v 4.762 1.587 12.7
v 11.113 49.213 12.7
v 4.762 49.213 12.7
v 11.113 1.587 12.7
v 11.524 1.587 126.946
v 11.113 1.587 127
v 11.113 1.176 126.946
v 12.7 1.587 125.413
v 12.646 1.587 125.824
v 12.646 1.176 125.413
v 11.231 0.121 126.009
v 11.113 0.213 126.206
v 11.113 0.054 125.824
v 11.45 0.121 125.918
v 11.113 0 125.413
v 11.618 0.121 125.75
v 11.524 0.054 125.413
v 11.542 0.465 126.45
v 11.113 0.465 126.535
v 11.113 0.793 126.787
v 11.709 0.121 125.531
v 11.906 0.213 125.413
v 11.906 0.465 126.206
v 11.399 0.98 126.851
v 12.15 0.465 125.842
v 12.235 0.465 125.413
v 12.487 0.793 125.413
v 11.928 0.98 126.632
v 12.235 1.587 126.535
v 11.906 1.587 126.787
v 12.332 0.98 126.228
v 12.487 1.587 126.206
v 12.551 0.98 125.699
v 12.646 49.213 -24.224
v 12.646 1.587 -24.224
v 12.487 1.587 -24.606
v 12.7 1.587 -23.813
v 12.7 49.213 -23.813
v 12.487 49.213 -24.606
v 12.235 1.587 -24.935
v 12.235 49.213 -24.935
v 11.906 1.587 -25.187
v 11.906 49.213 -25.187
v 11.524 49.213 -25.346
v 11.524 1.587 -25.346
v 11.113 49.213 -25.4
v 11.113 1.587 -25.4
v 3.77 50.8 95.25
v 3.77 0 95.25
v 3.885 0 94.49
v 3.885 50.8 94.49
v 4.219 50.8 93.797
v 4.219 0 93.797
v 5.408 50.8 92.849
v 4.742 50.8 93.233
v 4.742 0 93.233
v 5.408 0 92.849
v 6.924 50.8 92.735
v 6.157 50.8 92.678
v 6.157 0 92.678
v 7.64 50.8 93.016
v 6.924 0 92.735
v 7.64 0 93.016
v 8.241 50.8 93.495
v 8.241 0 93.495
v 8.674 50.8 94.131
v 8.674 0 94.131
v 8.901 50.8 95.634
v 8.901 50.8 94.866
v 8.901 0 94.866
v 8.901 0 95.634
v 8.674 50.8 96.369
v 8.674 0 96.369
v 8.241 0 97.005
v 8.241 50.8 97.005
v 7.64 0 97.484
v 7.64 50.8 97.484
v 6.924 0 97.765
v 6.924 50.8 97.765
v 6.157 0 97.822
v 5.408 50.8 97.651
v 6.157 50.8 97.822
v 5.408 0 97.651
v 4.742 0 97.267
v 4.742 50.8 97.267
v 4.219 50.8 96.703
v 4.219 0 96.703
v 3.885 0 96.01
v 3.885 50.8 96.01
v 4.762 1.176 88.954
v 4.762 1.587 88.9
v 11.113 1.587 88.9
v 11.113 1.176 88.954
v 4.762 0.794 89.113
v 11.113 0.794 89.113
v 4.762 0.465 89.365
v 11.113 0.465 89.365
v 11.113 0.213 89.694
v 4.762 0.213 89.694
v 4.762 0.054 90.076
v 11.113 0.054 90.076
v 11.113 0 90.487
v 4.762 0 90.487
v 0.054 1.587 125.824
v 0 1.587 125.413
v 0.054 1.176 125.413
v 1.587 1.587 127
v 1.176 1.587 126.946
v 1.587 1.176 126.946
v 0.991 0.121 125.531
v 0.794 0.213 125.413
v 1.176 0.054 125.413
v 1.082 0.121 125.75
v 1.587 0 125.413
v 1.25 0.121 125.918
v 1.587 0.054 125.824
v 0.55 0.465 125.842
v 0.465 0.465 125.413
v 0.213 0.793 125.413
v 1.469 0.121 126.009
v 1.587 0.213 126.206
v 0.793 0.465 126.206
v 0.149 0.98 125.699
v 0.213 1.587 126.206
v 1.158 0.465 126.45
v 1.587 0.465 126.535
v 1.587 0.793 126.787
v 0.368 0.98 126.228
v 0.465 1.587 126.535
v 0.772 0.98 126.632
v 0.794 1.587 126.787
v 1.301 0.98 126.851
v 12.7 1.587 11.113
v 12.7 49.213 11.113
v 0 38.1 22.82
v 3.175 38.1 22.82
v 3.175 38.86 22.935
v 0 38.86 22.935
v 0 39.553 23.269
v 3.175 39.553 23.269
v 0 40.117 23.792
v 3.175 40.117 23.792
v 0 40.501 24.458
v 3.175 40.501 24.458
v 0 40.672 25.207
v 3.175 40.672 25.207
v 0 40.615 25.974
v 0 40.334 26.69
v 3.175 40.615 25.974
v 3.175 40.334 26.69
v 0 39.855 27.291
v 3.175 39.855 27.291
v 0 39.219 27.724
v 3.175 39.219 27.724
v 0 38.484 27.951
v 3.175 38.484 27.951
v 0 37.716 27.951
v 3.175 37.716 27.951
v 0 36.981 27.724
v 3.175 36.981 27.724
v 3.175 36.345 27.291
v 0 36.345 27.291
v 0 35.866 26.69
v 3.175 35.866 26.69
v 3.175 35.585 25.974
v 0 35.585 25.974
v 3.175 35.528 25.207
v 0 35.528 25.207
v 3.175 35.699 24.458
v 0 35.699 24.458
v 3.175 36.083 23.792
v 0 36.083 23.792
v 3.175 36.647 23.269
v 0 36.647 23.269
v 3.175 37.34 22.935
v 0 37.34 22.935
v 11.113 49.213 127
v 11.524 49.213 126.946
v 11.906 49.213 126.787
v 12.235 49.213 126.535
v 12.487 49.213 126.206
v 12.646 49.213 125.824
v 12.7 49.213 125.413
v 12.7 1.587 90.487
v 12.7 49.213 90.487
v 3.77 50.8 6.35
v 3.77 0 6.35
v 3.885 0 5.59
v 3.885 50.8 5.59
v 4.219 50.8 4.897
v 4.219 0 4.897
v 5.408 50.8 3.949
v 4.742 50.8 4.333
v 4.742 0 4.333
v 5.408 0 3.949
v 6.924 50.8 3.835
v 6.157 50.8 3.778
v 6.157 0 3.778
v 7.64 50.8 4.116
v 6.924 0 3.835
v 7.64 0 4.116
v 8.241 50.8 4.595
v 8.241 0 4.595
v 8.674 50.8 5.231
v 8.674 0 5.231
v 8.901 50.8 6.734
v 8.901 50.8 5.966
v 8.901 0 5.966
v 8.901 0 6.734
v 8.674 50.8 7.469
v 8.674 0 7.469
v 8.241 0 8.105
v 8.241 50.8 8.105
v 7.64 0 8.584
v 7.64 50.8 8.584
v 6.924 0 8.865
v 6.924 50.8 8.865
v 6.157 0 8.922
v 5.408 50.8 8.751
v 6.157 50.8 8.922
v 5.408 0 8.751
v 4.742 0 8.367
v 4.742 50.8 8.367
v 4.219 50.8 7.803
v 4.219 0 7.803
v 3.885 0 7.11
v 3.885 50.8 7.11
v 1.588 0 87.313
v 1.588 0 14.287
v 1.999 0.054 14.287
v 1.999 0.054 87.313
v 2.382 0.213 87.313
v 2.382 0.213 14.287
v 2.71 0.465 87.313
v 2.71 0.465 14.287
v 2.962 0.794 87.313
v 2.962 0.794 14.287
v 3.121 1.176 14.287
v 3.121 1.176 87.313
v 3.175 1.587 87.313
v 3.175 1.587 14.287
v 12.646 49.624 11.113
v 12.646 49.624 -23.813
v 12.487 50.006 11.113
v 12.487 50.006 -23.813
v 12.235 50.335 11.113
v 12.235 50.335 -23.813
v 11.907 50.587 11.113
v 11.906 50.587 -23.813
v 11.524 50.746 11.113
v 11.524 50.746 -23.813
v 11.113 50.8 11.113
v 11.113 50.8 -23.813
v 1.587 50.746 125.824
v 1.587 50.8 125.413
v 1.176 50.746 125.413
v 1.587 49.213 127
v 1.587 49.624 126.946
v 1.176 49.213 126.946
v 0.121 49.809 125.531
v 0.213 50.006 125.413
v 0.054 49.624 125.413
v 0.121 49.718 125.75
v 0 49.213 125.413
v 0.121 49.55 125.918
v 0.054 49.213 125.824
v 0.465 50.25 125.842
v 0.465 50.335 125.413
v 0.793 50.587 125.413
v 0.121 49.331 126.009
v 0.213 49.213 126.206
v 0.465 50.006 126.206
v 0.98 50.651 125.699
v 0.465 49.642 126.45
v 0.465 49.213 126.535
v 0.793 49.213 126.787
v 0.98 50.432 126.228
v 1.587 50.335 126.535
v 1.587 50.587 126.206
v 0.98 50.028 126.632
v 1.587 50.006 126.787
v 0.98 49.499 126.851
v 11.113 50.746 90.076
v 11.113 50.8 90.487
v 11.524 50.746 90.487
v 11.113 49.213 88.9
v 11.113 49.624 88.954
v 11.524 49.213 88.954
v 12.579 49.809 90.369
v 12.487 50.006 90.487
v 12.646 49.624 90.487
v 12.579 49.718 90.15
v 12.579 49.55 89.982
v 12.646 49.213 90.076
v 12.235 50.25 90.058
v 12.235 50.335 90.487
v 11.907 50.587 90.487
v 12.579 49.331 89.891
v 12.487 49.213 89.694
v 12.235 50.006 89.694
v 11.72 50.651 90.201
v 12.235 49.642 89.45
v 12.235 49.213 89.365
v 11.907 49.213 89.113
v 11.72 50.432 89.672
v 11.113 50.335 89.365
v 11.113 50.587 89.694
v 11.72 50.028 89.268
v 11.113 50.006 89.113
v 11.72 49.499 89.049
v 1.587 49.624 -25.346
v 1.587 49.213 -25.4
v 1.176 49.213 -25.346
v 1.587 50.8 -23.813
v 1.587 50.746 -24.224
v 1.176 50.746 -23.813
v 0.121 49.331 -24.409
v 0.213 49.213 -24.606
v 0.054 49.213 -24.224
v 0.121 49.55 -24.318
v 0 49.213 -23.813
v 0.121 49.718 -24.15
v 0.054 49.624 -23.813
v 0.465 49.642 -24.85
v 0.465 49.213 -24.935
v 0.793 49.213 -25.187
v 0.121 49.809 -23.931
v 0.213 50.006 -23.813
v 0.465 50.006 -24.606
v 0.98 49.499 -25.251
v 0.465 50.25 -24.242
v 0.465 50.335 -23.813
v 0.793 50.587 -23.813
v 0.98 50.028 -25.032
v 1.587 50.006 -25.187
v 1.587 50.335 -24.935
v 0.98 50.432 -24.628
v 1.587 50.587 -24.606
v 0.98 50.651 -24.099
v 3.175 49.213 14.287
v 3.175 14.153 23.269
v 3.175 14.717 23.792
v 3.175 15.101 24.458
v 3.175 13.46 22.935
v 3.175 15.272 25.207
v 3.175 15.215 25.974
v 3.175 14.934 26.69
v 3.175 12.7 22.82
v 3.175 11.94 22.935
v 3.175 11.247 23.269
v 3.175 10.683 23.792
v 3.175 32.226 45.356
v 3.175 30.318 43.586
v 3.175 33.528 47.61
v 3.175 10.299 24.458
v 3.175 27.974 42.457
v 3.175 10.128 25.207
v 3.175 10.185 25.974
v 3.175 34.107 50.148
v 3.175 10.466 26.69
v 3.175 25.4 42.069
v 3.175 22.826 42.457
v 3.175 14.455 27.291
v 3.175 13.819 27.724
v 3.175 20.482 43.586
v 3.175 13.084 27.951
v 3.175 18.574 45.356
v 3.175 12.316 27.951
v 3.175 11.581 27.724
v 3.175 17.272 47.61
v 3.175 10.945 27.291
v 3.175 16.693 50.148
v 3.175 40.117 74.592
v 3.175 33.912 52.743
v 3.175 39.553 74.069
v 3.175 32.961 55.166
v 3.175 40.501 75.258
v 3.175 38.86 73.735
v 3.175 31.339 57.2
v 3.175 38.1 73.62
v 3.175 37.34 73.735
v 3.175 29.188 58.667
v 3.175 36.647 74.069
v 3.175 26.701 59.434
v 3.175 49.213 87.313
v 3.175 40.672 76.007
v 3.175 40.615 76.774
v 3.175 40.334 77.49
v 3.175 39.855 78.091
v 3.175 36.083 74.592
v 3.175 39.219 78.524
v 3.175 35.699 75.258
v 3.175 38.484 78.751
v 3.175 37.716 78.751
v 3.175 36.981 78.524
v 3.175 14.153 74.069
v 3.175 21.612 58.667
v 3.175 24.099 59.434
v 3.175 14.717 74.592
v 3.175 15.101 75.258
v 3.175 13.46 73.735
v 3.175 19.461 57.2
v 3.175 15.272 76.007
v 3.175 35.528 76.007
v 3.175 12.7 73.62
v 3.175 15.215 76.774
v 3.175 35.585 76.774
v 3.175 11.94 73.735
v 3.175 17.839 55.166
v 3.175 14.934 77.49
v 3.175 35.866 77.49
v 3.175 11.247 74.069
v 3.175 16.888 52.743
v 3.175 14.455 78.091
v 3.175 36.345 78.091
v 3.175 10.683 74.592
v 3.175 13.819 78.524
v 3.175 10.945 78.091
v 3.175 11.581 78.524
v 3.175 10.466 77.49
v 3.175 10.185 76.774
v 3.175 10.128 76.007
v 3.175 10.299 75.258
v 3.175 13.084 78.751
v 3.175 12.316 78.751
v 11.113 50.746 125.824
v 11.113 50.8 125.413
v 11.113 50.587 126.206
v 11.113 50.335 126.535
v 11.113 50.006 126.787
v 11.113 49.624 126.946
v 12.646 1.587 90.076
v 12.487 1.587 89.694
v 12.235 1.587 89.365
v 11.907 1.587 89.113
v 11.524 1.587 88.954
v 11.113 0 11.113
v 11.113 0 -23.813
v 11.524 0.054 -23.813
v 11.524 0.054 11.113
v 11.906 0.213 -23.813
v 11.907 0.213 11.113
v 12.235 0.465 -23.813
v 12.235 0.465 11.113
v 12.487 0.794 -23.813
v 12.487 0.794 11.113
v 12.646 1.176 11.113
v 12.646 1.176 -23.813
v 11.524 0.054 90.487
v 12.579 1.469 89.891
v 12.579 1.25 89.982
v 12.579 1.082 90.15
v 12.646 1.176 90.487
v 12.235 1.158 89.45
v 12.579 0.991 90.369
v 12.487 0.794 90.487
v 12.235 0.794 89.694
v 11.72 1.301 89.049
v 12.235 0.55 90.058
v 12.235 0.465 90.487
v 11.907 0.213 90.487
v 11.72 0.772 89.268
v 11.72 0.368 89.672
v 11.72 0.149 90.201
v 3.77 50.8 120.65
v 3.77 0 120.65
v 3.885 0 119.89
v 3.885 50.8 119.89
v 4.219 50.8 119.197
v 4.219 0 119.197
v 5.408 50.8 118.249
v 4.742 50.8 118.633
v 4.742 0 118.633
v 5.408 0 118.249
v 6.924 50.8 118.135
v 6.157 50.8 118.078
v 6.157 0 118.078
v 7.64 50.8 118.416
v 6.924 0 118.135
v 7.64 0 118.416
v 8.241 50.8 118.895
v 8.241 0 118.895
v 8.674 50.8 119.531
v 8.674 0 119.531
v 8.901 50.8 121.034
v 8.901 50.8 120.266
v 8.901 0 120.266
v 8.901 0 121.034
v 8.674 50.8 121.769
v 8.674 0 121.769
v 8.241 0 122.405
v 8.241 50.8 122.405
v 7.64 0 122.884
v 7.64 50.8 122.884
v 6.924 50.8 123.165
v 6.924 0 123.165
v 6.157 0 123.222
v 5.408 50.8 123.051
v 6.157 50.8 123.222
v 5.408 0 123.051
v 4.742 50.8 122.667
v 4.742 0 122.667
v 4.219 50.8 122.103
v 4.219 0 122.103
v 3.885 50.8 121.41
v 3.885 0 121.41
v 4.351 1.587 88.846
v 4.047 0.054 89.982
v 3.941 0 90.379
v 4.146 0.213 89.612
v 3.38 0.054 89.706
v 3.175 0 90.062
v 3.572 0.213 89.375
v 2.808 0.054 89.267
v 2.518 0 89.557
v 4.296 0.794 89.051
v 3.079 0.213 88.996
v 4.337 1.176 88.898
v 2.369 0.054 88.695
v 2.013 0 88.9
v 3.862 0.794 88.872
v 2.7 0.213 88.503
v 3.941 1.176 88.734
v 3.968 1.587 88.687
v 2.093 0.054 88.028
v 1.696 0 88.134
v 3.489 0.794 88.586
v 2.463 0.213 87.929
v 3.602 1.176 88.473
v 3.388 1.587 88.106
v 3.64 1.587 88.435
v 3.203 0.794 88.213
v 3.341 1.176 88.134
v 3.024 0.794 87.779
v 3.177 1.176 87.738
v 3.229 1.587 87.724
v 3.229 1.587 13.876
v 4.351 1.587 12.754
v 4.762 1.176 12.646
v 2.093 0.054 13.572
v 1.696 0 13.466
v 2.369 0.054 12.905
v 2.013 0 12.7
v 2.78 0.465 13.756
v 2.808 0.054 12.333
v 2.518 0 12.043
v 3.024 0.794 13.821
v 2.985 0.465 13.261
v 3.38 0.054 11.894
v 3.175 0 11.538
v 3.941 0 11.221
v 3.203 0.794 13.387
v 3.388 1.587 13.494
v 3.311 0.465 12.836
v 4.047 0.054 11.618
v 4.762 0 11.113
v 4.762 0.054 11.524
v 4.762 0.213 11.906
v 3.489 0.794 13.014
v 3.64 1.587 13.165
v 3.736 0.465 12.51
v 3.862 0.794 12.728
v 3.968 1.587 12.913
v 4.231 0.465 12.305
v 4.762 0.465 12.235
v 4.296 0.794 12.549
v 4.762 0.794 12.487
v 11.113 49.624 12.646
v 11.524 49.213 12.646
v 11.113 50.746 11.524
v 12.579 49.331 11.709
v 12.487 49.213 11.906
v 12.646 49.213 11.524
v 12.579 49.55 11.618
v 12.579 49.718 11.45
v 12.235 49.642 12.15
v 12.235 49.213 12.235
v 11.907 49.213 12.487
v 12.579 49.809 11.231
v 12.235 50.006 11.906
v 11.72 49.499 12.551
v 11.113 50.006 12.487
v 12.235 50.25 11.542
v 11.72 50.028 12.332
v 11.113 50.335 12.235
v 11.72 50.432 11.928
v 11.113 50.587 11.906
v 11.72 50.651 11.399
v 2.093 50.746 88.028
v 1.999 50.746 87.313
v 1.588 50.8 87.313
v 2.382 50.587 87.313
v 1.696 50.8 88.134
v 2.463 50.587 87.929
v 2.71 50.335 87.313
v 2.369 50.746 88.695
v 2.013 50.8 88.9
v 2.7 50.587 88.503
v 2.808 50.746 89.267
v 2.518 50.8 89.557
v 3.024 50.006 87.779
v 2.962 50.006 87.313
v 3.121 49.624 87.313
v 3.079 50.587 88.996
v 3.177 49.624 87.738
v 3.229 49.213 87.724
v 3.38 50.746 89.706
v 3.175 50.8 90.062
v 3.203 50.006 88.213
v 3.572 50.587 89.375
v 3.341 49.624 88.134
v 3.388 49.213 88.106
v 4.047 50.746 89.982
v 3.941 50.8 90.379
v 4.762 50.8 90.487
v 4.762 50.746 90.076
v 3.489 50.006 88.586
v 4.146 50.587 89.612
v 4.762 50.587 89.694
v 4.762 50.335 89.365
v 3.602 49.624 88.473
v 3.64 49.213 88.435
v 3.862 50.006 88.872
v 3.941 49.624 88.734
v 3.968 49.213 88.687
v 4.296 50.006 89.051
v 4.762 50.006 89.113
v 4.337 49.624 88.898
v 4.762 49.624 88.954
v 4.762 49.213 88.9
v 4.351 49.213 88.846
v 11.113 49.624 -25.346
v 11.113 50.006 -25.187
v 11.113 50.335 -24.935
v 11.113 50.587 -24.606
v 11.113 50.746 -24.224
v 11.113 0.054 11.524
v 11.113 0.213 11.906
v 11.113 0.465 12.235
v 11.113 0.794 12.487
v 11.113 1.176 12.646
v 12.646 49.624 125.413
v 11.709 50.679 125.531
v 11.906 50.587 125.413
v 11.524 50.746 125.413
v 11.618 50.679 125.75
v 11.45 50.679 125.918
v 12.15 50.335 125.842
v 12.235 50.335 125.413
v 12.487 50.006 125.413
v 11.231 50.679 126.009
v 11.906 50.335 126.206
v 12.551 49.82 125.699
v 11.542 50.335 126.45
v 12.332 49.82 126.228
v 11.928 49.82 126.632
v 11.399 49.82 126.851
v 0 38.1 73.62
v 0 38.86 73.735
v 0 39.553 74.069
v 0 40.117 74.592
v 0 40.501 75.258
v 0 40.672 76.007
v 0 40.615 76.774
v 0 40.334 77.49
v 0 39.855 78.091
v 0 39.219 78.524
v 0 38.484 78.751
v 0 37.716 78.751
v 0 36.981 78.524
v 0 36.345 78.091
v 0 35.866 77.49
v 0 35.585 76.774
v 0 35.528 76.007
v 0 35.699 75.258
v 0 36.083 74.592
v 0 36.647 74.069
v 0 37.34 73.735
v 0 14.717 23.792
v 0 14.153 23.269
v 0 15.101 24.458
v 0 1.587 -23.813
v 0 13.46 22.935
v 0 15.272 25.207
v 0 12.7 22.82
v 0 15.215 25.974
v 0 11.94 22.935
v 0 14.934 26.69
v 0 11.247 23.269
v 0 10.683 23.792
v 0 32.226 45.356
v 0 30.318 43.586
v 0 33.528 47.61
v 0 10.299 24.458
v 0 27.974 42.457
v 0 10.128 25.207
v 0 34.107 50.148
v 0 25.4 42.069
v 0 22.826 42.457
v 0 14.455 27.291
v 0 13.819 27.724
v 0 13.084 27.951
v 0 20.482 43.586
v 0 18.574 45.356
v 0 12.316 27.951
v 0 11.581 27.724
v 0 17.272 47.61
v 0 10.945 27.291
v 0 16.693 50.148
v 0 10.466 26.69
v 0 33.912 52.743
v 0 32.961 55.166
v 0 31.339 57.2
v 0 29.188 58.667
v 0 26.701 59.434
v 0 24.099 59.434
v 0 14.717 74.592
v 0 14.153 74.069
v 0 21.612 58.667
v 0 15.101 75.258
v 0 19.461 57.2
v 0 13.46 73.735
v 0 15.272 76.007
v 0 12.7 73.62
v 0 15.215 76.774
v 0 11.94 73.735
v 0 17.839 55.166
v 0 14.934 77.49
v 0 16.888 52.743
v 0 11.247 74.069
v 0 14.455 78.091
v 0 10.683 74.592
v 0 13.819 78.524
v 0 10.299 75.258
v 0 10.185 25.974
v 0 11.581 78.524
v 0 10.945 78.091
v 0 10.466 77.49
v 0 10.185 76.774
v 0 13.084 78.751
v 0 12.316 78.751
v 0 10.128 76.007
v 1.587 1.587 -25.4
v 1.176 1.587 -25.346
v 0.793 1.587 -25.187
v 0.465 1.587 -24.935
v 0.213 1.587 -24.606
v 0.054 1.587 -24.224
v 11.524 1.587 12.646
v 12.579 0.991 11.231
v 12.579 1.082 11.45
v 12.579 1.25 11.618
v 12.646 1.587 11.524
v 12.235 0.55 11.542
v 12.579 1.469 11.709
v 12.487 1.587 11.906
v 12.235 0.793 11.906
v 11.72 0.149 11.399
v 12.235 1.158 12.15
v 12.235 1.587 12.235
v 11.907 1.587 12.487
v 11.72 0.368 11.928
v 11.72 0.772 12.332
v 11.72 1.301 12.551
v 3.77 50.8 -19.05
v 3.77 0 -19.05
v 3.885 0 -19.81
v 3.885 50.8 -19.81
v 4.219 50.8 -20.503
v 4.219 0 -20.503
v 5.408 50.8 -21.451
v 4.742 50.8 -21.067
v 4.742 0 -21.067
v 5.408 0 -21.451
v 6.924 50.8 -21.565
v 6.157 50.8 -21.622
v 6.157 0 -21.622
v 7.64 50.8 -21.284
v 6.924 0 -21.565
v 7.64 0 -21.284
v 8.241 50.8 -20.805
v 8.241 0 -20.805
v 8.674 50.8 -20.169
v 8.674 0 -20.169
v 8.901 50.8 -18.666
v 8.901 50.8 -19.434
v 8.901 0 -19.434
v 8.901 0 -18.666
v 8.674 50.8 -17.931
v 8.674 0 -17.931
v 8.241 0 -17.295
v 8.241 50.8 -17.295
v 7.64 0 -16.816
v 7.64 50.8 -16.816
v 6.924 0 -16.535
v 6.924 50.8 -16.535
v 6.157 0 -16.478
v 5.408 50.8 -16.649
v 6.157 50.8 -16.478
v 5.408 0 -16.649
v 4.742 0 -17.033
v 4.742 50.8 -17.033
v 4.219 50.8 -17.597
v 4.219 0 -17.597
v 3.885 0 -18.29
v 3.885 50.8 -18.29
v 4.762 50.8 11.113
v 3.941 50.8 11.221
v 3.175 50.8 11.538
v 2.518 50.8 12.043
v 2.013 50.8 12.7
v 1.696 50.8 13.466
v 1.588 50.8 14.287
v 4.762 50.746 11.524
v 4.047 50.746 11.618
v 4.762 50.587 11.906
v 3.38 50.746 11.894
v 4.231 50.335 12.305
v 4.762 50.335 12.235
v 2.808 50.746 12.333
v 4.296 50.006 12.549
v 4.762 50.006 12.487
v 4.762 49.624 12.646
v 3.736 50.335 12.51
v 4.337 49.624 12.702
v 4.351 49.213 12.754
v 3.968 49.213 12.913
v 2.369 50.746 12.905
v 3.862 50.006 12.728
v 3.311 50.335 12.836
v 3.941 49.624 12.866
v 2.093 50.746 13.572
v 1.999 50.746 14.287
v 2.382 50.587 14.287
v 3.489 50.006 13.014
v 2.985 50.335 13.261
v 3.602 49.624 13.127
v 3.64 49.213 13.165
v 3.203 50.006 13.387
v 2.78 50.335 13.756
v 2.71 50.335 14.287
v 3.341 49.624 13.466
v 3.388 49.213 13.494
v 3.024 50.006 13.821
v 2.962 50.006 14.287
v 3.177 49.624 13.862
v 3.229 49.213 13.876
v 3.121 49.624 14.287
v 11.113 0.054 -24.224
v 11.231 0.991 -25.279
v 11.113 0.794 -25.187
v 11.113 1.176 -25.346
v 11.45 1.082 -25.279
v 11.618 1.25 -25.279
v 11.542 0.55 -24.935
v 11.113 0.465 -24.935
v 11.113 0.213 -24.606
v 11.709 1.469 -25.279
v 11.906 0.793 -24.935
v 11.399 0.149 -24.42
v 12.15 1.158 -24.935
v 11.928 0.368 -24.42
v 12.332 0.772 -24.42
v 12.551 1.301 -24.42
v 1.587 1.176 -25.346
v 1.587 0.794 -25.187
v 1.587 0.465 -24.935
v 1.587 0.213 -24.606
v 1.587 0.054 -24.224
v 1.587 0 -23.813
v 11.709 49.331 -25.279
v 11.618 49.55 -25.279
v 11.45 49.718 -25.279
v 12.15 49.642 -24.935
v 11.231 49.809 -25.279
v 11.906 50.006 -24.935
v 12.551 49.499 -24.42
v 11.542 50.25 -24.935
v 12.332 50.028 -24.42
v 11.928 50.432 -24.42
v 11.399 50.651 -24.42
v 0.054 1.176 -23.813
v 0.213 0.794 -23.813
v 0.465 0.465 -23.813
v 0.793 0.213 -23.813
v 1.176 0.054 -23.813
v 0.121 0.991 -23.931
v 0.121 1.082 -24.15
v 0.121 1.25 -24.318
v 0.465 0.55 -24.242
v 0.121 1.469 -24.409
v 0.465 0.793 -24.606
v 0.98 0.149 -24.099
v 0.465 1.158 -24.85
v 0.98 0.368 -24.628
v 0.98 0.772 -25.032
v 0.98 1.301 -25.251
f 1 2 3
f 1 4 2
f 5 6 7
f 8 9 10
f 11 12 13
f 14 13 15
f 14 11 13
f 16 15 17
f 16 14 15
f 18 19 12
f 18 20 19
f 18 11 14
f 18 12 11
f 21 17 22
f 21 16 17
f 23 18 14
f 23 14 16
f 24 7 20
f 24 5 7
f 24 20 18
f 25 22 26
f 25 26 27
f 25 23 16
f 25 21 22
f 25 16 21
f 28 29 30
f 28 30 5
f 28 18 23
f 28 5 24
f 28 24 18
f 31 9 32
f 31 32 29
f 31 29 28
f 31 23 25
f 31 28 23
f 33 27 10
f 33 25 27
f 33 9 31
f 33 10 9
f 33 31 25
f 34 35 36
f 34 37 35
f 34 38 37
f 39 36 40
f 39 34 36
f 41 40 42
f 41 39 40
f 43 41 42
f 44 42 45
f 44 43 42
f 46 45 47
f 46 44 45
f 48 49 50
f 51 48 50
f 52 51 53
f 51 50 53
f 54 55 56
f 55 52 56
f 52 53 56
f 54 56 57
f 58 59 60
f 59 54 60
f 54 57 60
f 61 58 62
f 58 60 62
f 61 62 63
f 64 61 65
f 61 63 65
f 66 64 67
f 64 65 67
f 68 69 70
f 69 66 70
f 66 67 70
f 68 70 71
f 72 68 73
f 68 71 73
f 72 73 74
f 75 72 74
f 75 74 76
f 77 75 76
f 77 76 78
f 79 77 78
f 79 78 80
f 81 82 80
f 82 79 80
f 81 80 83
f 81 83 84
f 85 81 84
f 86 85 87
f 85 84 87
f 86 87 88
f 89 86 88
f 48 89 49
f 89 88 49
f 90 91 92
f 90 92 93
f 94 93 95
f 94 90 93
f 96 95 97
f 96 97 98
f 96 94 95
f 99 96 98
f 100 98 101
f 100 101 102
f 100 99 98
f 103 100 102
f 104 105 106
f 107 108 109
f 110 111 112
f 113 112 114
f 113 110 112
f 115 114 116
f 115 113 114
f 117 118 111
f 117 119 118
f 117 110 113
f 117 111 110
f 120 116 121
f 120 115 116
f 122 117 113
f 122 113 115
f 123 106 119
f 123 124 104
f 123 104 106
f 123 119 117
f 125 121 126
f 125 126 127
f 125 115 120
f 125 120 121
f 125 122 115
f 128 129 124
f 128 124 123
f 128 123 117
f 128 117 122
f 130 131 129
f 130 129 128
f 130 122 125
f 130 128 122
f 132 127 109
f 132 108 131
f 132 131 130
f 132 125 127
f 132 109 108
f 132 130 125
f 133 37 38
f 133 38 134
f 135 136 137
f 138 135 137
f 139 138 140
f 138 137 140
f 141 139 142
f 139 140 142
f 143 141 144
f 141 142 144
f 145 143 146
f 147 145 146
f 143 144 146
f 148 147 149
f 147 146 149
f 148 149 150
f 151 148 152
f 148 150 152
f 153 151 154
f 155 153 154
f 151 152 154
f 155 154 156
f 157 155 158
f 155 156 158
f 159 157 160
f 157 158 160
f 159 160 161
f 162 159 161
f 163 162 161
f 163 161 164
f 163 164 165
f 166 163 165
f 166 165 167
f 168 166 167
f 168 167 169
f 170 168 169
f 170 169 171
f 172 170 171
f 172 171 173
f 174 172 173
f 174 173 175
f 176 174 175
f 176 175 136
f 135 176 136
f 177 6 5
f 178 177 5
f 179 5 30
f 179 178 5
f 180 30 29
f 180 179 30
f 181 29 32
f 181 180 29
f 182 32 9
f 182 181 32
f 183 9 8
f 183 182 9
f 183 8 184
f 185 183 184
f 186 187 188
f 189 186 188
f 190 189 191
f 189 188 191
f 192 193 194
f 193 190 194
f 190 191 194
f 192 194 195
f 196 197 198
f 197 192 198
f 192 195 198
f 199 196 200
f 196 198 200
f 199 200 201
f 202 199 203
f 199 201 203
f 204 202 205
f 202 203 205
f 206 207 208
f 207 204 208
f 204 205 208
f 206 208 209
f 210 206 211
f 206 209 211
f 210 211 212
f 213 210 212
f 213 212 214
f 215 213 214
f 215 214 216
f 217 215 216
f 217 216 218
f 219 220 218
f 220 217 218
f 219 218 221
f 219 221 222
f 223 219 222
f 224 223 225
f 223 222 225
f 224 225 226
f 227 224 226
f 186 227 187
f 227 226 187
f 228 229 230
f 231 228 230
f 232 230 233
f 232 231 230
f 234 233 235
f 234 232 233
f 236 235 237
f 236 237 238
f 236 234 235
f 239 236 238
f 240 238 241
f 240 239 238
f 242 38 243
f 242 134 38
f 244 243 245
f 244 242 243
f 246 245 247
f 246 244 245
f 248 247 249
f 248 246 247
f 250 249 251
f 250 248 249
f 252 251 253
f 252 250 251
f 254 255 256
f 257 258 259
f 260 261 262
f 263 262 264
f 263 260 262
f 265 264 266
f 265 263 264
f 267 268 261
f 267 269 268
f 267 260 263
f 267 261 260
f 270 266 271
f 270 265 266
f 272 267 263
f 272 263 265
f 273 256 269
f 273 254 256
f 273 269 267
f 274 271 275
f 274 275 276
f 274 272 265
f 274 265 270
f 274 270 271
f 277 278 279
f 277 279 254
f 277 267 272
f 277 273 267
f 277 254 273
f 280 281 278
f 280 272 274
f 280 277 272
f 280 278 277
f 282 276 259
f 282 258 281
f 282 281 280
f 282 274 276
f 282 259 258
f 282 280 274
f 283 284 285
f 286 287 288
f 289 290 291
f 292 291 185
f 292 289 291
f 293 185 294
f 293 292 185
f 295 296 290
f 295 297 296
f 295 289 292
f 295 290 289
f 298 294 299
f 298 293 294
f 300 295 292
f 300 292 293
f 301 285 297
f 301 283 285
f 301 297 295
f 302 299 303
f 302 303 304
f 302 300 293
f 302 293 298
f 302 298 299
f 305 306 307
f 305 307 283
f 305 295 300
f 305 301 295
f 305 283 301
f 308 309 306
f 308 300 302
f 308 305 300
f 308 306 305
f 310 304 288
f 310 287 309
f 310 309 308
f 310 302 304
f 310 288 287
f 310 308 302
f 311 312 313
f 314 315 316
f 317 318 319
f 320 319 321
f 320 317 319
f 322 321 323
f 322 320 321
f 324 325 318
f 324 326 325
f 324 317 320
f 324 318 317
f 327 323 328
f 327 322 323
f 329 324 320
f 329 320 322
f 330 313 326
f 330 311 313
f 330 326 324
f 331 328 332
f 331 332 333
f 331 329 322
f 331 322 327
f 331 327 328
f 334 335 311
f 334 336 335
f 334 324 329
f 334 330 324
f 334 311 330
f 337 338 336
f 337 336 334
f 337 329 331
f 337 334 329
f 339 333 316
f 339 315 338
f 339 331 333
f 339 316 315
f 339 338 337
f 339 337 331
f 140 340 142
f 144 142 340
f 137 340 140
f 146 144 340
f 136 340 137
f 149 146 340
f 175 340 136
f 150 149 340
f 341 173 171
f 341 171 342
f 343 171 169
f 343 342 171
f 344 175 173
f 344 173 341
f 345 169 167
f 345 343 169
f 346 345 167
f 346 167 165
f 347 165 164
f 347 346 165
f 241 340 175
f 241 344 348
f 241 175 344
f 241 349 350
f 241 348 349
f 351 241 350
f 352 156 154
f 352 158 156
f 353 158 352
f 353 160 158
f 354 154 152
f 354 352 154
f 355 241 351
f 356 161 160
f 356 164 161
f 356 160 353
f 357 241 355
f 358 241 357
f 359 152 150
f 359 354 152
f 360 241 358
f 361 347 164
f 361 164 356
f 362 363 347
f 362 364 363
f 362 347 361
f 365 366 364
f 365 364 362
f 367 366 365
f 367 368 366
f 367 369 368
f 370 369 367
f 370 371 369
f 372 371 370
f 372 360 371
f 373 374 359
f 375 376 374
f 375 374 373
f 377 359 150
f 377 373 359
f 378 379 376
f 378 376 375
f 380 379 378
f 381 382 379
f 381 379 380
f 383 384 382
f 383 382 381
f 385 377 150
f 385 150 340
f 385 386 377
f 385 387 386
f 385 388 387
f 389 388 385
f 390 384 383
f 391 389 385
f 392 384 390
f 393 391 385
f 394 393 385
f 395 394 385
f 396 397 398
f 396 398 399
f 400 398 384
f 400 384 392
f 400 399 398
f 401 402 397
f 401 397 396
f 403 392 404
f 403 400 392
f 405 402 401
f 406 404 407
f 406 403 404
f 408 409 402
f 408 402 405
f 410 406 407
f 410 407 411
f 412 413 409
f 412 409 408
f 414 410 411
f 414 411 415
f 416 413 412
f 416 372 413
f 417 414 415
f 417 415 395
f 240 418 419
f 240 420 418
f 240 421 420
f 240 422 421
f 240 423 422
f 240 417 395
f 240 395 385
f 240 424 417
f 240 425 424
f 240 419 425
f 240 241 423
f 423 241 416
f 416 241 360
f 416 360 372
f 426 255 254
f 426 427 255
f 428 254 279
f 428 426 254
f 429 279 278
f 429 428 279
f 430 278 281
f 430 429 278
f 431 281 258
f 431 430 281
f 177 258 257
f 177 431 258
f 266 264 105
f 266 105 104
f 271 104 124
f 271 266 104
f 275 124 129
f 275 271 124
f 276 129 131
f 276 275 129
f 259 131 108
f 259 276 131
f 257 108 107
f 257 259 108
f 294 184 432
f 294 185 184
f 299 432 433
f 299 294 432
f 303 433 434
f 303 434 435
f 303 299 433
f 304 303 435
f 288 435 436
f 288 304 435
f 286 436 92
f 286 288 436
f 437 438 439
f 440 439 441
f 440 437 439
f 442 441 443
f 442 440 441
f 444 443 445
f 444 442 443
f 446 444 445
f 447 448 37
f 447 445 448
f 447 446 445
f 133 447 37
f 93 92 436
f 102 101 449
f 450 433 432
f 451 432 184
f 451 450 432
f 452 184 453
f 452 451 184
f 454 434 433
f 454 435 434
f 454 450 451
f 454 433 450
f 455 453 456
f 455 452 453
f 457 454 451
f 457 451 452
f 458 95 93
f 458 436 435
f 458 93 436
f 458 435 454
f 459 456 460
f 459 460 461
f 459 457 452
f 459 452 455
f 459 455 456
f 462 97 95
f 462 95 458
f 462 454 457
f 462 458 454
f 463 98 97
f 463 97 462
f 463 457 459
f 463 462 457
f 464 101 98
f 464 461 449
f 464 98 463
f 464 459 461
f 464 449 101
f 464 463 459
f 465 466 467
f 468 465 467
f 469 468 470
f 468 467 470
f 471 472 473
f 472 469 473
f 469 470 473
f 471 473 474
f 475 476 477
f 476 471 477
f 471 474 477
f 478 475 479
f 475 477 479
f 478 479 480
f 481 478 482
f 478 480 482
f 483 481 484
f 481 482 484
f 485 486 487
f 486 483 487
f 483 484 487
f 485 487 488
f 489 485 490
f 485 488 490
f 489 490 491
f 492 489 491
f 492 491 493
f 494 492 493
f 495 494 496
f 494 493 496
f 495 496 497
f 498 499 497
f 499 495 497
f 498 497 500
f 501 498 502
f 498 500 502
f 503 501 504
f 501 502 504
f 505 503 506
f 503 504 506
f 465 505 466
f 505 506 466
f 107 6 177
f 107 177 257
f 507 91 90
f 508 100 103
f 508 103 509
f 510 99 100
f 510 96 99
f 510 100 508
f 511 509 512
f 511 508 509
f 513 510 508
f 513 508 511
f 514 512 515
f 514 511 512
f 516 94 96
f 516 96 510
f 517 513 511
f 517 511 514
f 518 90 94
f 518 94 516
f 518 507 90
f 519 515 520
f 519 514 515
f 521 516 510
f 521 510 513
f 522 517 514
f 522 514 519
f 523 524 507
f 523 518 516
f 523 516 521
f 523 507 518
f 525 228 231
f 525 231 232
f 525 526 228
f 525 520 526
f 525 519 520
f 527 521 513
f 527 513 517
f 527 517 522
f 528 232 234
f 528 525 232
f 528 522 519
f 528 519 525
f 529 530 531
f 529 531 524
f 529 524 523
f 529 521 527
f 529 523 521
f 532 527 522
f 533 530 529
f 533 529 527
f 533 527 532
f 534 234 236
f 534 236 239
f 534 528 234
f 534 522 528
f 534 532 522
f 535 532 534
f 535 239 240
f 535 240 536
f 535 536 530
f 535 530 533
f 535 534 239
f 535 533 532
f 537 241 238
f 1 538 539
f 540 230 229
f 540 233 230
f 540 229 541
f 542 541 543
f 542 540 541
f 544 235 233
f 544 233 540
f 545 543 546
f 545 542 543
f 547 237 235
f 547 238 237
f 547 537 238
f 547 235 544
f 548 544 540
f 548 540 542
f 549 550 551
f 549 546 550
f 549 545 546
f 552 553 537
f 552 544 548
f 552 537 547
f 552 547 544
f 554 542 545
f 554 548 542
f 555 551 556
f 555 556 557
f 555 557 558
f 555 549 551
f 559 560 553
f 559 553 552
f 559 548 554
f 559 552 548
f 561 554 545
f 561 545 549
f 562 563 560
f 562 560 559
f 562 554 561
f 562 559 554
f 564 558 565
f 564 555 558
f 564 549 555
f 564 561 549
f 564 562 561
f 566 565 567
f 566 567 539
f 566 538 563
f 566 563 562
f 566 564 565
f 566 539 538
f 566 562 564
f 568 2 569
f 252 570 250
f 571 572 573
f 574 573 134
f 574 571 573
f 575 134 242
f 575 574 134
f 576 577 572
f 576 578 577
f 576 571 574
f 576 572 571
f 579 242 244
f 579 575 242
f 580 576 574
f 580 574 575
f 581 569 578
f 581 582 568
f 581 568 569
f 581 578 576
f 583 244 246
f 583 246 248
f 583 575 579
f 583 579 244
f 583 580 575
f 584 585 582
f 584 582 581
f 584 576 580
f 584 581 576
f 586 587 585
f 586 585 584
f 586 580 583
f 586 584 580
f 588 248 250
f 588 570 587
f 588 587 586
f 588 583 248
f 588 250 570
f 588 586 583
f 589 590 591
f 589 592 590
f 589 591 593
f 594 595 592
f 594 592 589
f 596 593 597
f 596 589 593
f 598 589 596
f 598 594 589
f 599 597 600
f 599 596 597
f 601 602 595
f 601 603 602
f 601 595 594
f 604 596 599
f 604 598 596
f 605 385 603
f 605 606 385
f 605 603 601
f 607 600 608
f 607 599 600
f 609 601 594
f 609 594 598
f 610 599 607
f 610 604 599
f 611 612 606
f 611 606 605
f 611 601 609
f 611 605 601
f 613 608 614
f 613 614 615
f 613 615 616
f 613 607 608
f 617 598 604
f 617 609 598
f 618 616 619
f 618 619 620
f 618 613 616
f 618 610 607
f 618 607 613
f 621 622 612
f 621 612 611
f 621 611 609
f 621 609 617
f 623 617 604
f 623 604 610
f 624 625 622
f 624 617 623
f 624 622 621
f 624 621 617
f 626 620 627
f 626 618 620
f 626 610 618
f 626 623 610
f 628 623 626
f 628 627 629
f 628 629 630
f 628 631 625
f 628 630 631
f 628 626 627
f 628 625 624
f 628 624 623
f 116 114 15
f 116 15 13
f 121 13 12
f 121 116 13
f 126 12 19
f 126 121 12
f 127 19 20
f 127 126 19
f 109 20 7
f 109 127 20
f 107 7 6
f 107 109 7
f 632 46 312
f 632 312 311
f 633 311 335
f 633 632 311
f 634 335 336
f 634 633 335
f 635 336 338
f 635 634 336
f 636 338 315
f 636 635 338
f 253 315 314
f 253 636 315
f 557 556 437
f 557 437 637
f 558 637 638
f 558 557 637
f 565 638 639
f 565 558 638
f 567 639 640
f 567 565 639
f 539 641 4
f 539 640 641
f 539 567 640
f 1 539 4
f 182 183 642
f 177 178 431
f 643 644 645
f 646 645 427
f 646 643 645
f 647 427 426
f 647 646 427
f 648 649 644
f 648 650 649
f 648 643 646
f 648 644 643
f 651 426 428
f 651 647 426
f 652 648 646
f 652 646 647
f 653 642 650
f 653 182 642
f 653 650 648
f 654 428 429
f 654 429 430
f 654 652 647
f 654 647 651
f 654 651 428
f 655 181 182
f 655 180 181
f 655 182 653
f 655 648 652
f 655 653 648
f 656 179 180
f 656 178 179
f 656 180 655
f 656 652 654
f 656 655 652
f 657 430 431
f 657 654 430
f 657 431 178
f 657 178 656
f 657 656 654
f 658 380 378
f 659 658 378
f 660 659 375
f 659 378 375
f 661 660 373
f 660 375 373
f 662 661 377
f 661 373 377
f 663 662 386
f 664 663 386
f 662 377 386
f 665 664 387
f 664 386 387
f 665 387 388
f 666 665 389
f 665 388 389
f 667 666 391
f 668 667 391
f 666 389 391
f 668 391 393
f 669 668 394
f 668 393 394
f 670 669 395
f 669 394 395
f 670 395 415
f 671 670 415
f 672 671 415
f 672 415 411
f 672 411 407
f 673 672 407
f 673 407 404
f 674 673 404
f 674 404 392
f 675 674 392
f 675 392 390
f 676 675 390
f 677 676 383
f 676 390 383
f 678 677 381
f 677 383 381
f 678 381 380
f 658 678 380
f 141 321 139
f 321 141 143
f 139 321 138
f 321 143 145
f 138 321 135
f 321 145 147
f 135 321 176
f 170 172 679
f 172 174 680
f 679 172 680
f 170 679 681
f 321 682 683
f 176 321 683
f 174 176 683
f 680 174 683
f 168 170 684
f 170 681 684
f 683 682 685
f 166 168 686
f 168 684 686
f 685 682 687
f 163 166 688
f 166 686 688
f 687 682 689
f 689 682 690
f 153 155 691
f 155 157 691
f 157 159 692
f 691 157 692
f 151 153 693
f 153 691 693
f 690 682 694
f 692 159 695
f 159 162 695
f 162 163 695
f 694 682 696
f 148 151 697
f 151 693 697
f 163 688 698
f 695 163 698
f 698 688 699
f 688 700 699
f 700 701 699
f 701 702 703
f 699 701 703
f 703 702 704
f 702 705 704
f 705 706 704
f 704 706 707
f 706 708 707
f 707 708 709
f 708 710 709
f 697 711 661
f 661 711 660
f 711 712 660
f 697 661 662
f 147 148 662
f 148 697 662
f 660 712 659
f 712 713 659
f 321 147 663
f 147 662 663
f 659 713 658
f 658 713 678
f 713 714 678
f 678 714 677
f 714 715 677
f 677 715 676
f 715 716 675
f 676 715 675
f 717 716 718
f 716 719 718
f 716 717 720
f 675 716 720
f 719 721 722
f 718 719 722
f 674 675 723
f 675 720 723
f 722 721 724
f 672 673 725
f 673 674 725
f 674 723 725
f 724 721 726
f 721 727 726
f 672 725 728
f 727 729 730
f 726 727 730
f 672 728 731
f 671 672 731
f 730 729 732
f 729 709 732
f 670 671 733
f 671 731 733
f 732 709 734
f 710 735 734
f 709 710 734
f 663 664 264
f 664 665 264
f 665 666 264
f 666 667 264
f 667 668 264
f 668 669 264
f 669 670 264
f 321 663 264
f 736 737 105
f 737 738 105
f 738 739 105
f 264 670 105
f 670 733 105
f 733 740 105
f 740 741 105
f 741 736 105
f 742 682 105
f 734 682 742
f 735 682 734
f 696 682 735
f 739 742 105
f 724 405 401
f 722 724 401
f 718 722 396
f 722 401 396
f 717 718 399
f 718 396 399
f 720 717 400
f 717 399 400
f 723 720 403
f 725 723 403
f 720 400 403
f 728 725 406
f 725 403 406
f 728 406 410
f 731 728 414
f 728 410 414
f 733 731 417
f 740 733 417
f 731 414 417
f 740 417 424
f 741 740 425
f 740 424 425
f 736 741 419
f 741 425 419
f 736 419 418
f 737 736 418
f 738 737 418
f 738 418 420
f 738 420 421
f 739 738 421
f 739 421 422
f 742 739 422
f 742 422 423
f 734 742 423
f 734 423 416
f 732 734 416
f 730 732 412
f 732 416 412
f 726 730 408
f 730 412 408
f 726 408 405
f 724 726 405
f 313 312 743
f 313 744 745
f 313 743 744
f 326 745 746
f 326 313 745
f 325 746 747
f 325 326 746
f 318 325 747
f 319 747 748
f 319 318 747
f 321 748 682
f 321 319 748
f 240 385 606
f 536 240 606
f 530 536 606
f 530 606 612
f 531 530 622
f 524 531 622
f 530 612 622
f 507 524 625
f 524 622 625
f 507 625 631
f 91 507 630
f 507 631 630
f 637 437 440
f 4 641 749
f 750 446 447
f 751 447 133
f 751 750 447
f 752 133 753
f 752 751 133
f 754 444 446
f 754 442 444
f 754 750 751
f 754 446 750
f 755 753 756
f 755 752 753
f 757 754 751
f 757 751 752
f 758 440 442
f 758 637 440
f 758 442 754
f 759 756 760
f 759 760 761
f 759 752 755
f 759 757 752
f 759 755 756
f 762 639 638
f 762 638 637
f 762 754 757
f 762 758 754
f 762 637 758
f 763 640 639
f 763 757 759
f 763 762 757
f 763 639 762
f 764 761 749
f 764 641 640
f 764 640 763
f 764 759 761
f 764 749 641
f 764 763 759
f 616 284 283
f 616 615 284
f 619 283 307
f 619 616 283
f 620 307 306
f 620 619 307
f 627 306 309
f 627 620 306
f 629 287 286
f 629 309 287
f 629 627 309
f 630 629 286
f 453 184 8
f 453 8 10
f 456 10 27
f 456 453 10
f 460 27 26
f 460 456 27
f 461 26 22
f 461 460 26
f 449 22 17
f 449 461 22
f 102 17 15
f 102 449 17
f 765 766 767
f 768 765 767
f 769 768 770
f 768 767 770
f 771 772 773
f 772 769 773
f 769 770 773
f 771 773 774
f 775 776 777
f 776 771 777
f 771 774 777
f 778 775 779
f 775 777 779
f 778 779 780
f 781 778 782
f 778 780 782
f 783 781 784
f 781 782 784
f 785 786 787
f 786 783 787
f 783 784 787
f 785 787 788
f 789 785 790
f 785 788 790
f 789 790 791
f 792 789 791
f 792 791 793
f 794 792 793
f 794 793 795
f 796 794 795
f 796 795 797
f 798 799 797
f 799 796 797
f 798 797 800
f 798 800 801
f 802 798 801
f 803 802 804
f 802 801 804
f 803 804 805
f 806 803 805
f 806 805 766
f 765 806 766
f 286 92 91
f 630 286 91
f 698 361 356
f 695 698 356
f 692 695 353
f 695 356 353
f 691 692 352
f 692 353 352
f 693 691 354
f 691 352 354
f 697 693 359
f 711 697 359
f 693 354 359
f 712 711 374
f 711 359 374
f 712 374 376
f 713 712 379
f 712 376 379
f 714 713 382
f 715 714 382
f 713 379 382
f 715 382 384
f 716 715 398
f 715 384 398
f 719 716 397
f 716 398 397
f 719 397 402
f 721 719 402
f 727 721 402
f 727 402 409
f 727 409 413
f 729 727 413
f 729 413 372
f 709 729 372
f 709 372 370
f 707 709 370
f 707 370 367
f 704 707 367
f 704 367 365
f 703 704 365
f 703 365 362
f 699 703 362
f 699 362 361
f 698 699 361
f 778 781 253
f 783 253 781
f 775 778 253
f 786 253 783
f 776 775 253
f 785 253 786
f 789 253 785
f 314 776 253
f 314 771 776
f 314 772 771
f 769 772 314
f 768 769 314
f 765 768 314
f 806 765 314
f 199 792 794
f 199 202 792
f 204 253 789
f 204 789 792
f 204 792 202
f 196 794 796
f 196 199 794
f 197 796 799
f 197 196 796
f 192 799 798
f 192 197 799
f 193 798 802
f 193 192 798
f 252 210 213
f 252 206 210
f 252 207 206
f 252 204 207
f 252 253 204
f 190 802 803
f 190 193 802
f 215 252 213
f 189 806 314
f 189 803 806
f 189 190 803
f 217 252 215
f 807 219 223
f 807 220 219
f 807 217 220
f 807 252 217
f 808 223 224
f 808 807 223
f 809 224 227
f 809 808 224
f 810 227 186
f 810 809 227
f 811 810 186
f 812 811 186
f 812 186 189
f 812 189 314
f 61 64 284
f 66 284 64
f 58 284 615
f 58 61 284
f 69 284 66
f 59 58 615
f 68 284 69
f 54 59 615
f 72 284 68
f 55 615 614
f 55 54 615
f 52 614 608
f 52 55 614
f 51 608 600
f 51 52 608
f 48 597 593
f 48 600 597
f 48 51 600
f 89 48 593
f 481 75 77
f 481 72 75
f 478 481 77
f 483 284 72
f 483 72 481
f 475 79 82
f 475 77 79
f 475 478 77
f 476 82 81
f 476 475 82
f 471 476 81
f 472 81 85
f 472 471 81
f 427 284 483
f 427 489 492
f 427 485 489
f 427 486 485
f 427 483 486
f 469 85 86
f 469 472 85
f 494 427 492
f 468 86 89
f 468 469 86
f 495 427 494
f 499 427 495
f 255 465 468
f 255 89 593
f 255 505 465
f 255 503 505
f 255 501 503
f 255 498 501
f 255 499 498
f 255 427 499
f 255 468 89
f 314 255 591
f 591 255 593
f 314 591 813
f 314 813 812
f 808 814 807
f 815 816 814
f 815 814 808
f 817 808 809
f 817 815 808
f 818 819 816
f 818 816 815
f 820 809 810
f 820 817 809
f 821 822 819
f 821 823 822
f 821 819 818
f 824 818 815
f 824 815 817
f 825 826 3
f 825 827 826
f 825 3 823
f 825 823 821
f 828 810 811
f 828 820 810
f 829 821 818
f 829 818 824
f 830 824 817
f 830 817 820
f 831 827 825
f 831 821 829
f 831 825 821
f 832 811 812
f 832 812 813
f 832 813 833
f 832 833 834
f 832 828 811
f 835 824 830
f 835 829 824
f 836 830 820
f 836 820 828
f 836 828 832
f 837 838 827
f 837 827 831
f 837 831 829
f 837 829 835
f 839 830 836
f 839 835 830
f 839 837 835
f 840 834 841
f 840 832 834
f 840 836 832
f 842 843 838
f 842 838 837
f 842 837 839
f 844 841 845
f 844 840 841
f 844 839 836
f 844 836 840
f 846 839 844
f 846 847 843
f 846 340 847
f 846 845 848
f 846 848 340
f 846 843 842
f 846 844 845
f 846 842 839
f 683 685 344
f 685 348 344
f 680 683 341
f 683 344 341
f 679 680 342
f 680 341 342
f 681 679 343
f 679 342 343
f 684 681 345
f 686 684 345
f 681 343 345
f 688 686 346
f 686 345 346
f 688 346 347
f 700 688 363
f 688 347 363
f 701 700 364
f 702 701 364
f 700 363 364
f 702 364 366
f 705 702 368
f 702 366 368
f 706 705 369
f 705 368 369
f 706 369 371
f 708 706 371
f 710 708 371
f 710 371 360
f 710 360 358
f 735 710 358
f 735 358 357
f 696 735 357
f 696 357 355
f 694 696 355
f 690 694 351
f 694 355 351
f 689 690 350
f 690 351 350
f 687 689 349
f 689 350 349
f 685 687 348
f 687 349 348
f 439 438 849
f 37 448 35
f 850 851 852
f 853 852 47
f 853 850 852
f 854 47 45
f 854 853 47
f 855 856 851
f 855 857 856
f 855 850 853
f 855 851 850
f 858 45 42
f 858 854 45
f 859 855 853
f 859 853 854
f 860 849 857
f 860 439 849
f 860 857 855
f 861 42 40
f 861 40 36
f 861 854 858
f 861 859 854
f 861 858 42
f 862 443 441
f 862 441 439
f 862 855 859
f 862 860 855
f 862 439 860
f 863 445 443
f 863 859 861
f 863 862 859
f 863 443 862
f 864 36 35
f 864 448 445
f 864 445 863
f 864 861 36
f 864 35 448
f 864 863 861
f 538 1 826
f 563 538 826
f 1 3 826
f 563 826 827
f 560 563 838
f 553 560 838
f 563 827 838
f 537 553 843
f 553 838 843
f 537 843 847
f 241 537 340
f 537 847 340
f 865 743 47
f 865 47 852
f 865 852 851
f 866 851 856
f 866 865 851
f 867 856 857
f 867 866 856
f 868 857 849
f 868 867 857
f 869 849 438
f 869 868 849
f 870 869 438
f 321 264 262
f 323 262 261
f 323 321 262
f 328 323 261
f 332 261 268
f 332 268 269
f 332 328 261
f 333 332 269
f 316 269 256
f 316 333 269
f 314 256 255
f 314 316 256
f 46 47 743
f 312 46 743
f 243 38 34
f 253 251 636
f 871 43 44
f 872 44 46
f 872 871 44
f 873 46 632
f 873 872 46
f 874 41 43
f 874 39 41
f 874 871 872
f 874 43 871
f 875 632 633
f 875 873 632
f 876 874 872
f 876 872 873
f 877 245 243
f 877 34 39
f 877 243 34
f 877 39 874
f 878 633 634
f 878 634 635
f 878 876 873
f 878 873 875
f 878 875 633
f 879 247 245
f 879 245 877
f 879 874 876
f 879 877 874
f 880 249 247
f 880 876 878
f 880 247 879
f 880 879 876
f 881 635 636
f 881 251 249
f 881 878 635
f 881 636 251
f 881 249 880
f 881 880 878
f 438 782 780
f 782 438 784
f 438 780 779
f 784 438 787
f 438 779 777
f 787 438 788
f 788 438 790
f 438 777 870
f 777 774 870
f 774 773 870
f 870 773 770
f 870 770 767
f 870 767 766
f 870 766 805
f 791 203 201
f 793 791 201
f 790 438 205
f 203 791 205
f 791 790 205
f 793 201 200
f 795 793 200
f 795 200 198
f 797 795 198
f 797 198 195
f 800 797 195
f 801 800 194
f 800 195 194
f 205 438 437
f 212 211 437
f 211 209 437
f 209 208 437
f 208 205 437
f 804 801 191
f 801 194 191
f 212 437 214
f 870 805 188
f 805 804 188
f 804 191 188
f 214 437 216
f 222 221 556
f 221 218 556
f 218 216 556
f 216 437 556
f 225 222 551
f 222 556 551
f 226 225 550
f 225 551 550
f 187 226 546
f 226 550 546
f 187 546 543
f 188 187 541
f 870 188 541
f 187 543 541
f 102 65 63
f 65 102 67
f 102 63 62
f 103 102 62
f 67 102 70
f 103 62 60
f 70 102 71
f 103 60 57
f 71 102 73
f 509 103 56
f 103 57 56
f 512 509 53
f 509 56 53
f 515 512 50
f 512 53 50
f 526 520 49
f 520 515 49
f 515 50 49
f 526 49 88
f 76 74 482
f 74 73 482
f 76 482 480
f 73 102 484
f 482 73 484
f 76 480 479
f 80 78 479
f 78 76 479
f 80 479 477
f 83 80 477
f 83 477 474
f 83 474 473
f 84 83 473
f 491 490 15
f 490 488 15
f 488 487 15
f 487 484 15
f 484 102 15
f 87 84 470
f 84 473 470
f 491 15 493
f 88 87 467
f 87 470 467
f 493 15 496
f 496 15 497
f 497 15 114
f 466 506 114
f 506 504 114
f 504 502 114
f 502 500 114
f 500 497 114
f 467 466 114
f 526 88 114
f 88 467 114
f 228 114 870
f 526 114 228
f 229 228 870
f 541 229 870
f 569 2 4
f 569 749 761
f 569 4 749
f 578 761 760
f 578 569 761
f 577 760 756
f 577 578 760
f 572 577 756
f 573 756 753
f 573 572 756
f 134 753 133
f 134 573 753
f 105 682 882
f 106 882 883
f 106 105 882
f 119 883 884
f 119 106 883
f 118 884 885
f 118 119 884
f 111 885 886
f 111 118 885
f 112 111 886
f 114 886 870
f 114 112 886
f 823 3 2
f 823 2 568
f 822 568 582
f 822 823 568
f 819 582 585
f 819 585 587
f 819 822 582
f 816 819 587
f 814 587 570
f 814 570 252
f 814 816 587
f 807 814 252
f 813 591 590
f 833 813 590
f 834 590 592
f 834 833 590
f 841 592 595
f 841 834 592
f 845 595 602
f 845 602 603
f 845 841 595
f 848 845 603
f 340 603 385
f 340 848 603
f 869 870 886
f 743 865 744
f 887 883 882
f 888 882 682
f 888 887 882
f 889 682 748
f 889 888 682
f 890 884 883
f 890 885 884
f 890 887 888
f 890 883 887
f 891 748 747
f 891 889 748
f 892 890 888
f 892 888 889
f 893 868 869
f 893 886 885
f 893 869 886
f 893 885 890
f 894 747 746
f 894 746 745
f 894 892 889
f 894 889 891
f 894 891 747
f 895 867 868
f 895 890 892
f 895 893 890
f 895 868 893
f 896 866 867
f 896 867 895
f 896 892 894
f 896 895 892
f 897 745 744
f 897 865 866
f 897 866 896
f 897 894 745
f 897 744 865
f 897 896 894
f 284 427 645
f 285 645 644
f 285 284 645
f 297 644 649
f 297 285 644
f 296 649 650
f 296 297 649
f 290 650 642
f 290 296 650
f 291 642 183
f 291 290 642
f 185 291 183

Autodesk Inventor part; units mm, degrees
ref_plane "YZ Plane" through (0, 0, 0) normal (1, 0, 0) x (0, 1, 0)
ref_plane "XZ Plane" through (0, 0, 0) normal (0, 1, 0) x (-1, 0, 0)
ref_plane "XY Plane" through (0, 0, 0) normal (0, 0, 1) x (1, 0, 0)
sketch "Sketch1" plane through (0, 0, 0) normal (0, 1, 0) x (-1, 0, 0)
  line L0 (0, 0) -> (-3.175, 0)
  line L1 (-3.175, 0) -> (-3.175, 101.6)
  line L2 (-3.175, 101.6) -> (0, 101.6)
  line L3 (0, 101.6) -> (0, 0)
  line L4 (0, 0) -> (-3.175, 0)
  line L5 (-3.175, 0) -> (-3.175, -25.4)
  line L6 (-3.175, -25.4) -> (0, -25.4)
  line L7 (0, -25.4) -> (0, 0)
  line L8 (0, 101.6) -> (-3.175, 101.6)
  line L9 (-3.175, 101.6) -> (-3.175, 127)
  line L10 (-3.175, 127) -> (0, 127)
  line L11 (0, 127) -> (0, 101.6)
  circle A0 centre (-6.35, 120.65) radius 2.5797
  circle A1 centre (-6.35, 95.25) radius 2.5797
  line L12 (0, 127) -> (-12.7, 127)
  line L13 (-12.7, 127) -> (-12.7, 88.9)
  line L14 (-12.7, 88.9) -> (0, 88.9)
  line L15 (0, 88.9) -> (0, 127)
  line L16 (25.4, 50.8) -> (-25.4, 50.8)
  line L17 (25.4, 50.8) -> (76.2, 50.8) construction
  line L18 (-3.175, 101.6) -> (-3.175, 0)
  line L19 (-3.175, 0) -> (0, 0)
  line L20 (0, 0) -> (0, 101.6)
  line L21 (0, 0) -> (-3.175, 0)
  line L22 (-3.175, 0) -> (-3.175, -25.4)
  line L23 (-3.175, -25.4) -> (0, -25.4)
  line L24 (0, -25.4) -> (0, 0)
  circle A2 centre (-6.35, -19.05) radius 2.5797
  circle A3 centre (-6.35, 6.35) radius 2.5797
  line L25 (0, -25.4) -> (-12.7, -25.4)
  line L26 (-12.7, -25.4) -> (-12.7, 12.7)
  line L27 (-12.7, 12.7) -> (0, 12.7)
  line L28 (0, 12.7) -> (0, -25.4)
  point P0 (-3.175, 88.9)
  point P1 (-3.175, 12.7)
  dimension "d25" = 3.175
  dimension "d26" = 101.6
  dimension "d27" = 3.175
  dimension "d28" = 25.4
  dimension "d29" = 3.175
  dimension "d30" = 25.4
  dimension "d31" = 0
  dimension "d32" = 25.4
  dimension "d33" = 6.35
  dimension "d34" = 5.1594
  dimension "d35" = 5.1594
  dimension "d36" = 12.7
  dimension "d37" = 38.1
  dimension "d38" = 6.35
  dimension "d39" = 50.8
  dimension "d40" = 180
  dimension "d41" = 50.8
  dimension "d42" = 25.4
extrude "Extrusion1" add sketch "Sketch1" along normal blind 50.8
sketch "Sketch3" plane through (3.175, 0, 88.9) normal (1, 0, 0) x (0, 0, -1)
  circle A0 centre (12.7, 12.7) radius 2.5797
  line L0 (0, 0) -> (76.2, 0) projected
  line L1 (0, 0) -> (0, 50.8) projected
  circle A1 centre (63.5, 12.7) radius 2.5797
  circle A2 centre (12.7, 38.1) radius 2.5797
  circle A3 centre (63.5, 38.1) radius 2.5797
  circle A4 centre (38.1, 25.4) radius 8.7312
  point P0 (88.9, 0)
  dimension "d43" = 12.7
  dimension "d44" = 12.7
  dimension "d45" = 5.1594
  dimension "d48" = 50.8
  dimension "d51" = 25.4
  dimension "d56" = 17.4625
  dimension "d57" = 25.4
  dimension "d58" = 38.1
extrude "Extrusion3" cut sketch "Sketch3" against normal blind 50.8
fillet "Fillet2" radius 1.5875 24 edges at (7.9375, 50.8, 88.9) (7.9375, 0, 88.9) (3.175, 25.4, 88.9) (12.7, 25.4, 88.9) (12.7, 25.4, 127) (12.7, 50.8, 107.95) (6.35, 50.8, 127) (0, 25.4, 127) (12.7, 0, 107.95) (6.35, 0, 127) (3.175, 50.8, 50.8) (3.175, 0, 50.8) (3.175, 25.4, 12.7) (7.9375, 50.8, 12.7) (7.9375, 0, 12.7) (12.7, 25.4, 12.7) (12.7, 50.8, -6.35) (12.7, 0, -6.35) (12.7, 25.4, -25.4) (6.35, 50.8, -25.4) (6.35, 0, -25.4) (0, 25.4, -25.4) (0, 0, 50.8) (0, 50.8, 50.8)
equation "\"d35\" = d34"
properties part number "Connector plate"
